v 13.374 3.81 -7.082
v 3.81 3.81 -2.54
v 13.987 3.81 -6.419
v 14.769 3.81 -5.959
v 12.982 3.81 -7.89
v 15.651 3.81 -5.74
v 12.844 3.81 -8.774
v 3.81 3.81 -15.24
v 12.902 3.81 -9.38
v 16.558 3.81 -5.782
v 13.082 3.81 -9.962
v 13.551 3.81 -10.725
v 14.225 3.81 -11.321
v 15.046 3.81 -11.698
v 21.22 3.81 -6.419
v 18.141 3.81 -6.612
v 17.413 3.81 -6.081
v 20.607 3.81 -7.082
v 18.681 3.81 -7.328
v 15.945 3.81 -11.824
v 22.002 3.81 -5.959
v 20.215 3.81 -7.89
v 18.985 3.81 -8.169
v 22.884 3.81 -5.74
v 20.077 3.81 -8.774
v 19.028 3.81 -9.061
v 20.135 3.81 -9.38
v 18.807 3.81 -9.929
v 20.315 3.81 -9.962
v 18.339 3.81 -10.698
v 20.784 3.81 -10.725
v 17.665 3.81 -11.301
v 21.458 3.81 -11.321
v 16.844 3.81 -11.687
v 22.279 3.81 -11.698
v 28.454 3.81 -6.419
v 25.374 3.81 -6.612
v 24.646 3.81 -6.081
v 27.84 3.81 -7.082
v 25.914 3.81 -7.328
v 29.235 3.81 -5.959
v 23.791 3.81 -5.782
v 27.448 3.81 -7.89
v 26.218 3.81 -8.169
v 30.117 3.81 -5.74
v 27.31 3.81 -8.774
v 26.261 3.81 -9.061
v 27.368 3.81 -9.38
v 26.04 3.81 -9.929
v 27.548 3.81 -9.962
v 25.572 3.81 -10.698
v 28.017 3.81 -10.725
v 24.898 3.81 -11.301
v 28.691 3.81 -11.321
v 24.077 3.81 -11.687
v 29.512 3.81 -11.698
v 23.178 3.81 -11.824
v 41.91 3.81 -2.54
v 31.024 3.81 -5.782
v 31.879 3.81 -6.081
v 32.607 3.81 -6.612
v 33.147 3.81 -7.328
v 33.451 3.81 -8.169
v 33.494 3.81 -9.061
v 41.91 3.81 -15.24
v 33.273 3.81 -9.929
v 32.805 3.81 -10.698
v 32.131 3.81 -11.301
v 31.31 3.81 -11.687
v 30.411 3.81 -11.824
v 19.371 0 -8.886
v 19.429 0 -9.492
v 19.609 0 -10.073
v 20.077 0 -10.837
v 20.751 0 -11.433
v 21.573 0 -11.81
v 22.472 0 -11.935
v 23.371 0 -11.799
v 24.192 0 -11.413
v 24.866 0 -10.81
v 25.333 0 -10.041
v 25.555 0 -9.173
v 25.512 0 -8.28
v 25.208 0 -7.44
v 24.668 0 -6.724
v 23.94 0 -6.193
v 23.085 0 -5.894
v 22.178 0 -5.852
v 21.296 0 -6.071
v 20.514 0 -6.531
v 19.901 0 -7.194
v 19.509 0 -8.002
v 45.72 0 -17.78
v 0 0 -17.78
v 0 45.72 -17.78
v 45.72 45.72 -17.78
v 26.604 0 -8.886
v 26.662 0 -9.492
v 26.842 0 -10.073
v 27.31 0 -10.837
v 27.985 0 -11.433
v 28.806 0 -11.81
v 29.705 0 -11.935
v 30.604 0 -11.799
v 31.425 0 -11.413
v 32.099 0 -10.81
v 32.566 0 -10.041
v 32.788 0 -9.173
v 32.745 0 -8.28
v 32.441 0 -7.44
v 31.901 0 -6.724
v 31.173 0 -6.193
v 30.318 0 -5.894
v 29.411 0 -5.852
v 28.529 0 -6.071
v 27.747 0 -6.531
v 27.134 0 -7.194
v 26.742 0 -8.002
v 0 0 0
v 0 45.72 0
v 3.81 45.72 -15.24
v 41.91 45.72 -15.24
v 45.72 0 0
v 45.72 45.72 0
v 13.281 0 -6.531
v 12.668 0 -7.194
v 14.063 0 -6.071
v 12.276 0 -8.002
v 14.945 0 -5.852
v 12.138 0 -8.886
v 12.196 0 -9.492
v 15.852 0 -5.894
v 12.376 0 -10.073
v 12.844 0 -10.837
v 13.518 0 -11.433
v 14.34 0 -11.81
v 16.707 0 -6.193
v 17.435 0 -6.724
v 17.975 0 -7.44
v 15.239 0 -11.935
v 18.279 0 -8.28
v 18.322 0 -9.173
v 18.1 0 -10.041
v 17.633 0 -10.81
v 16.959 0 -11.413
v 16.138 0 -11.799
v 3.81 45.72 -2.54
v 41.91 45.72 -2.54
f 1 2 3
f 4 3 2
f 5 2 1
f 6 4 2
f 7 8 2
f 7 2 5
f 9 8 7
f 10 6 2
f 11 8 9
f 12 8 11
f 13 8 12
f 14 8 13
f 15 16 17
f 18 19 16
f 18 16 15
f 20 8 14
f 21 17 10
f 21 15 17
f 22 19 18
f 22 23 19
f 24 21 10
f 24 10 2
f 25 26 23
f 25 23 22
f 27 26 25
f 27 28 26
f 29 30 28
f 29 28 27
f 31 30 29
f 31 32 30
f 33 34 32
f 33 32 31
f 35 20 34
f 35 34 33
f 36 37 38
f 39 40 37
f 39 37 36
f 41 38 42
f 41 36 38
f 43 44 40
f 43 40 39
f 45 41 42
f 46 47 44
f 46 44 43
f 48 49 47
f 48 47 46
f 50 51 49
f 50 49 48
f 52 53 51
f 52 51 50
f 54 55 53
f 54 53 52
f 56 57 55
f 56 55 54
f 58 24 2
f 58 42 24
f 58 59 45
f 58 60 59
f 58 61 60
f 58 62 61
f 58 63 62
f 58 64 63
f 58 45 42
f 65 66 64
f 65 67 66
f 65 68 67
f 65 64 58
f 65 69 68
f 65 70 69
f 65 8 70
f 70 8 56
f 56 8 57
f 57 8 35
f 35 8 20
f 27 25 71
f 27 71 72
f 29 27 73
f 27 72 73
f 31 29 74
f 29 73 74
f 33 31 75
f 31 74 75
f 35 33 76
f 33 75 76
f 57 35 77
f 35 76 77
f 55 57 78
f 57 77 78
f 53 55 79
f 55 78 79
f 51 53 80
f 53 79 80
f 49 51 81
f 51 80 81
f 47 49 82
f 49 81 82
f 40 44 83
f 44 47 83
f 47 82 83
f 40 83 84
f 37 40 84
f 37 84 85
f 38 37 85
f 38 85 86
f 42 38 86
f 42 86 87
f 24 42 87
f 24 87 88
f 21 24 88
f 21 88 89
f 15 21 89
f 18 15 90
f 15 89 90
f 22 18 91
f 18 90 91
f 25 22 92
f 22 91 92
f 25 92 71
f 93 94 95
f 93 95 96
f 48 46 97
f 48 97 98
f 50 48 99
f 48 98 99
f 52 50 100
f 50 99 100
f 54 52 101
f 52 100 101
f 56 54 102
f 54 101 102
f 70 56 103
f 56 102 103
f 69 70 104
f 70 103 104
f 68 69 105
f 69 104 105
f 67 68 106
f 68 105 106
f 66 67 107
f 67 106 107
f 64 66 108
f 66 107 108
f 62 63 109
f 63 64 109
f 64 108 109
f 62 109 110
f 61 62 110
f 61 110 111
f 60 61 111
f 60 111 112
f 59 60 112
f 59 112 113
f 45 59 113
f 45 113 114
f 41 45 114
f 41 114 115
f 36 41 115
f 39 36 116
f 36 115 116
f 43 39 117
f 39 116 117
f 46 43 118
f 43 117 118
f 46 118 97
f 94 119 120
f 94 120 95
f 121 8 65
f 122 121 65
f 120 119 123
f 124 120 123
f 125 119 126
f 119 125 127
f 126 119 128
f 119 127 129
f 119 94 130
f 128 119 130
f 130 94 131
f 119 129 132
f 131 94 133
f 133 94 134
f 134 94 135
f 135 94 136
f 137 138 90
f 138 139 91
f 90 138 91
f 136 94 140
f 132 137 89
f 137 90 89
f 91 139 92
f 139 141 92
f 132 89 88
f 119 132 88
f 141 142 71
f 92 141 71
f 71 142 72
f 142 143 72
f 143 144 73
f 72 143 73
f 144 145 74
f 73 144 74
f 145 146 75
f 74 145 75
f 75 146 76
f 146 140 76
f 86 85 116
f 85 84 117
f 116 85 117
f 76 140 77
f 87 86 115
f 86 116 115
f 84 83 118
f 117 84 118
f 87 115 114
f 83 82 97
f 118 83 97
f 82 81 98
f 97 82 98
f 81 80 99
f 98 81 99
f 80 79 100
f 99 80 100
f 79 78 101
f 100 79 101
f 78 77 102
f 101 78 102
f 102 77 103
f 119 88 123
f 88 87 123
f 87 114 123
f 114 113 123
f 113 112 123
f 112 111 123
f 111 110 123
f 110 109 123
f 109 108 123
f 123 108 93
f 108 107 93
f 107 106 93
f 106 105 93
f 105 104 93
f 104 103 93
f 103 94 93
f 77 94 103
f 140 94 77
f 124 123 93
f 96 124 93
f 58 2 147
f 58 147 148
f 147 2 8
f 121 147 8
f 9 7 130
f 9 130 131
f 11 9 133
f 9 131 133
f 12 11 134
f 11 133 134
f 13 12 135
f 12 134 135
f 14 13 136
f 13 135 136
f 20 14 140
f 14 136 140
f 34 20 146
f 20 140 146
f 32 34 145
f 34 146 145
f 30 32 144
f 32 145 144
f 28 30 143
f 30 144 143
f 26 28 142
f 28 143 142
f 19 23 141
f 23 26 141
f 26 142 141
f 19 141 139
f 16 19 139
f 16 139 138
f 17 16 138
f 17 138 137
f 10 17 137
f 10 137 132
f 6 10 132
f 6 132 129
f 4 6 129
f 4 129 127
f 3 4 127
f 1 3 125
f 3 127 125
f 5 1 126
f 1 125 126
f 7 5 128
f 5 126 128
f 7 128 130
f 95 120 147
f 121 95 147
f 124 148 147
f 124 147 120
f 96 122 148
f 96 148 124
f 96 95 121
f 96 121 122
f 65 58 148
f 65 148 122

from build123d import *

# Parameters (mm, degrees)
SKETCH1_W               = 45.72
SKETCH1_H               = 17.78
BOSS_EXTRUDE1_DEPTH     = 45.72
SKETCH2_W               = 38.1
SKETCH2_H               = 12.7
CUT_EXTRUDE1_DEPTH      = 41.91
SKETCH6_R               = 3.048
CUT_EXTRUDE2_DEPTH      = 1.512975339
CUT_EXTRUDE2_DEPTH_BACK = 15.24


with BuildPart() as part:
    # Sketch1 → Boss-Extrude1 (new body)
    with BuildSketch(Plane(origin=(0, 0, 0), x_dir=(1, 0, 0), z_dir=(0, 1, 0))):
        with Locations((22.86, 8.89)):
            Rectangle(SKETCH1_W, SKETCH1_H)
    extrude(amount=BOSS_EXTRUDE1_DEPTH)

    # Sketch2 → Cut-Extrude1 (cut)
    with BuildSketch(Plane(origin=(0, 45.72, 0), x_dir=(1, 0, 0), z_dir=(0, 1, 0))):
        with Locations((22.86, 8.89)):
            Rectangle(SKETCH2_W, SKETCH2_H)
    extrude(amount=-CUT_EXTRUDE1_DEPTH, mode=Mode.SUBTRACT)

    # Sketch6 → Cut-Extrude2 (cut, two sides)
    with BuildSketch(Plane(origin=(0, 0, 0), x_dir=(-0.983268965, 0.18208123, 0.005344962), z_dir=(-0.182159664, -0.982845594, -0.028851256))) as cut_extrude2_sk:
        with Locations((-22.14222649, 8.882344385)):
            Circle(SKETCH6_R)
        with Locations((-15.03022649, 8.882344385)):
            Circle(SKETCH6_R)
        with Locations((-29.25422649, 8.882344385)):
            Circle(SKETCH6_R)
    extrude(amount=CUT_EXTRUDE2_DEPTH, mode=Mode.SUBTRACT)
    extrude(cut_extrude2_sk.sketch, amount=-CUT_EXTRUDE2_DEPTH_BACK, mode=Mode.SUBTRACT)


solid = part.part
